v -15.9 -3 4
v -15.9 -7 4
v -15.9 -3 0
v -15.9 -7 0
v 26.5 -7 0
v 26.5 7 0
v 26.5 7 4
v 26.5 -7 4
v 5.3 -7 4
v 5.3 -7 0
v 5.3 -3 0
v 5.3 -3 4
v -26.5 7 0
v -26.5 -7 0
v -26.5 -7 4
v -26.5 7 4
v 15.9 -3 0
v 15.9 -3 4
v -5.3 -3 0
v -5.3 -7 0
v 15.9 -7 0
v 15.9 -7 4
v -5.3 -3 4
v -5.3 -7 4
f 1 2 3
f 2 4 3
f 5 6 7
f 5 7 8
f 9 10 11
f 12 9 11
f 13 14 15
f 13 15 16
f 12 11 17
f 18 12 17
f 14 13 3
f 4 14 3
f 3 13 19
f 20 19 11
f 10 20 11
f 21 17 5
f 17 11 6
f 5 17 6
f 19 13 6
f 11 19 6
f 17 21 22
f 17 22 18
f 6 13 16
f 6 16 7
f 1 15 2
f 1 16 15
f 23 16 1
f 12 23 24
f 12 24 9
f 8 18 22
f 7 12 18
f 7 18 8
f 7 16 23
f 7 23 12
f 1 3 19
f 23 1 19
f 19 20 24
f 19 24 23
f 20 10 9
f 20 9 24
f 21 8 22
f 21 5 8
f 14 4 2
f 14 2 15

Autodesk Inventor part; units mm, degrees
ref_plane "YZ Plane" through (0, 0, 0) normal (1, 0, 0) x (0, 1, 0)
ref_plane "XZ Plane" through (0, 0, 0) normal (0, 1, 0) x (-1, 0, 0)
ref_plane "XY Plane" through (0, 0, 0) normal (0, 0, 1) x (1, 0, 0)
sketch "Sketch1" plane through (0, 0, 0) normal (0, 0, 1) x (1, 0, 0)
  line L0 (-26.5, 7) -> (26.5, 7)
  line L1 (26.5, 7) -> (26.5, -7)
  line L2 (26.5, -7) -> (-26.5, -7)
  line L3 (-26.5, -7) -> (-26.5, 7)
  line L4 (-26.5, 7) -> (26.5, -7) construction
  line L5 (26.5, 7) -> (-26.5, -7) construction
  line L6 (26.5, -7) -> (15.9, -7)
  line L7 (15.9, -7) -> (15.9, -3)
  line L8 (15.9, -3) -> (26.5, -3)
  line L9 (26.5, -3) -> (26.5, -7)
  line L10 (5.3, -7) -> (5.3, -3)
  line L11 (5.3, -3) -> (15.9, -3)
  line L12 (-5.3, -7) -> (-5.3, -3)
  line L13 (-5.3, -3) -> (5.3, -3)
  line L14 (-15.9, -7) -> (-15.9, -3)
  line L15 (-15.9, -3) -> (-5.3, -3)
  line L16 (-26.5, -7) -> (-26.5, -3)
  line L17 (-26.5, -3) -> (-15.9, -3)
  point P0 (0, 0)
  dimension "d0" = 53
  dimension "d1" = 14
  dimension "d2" = 10.6
  dimension "d3" = 4
  dimension "d6" = 10.6
extrude "Extrusion1" add sketch "Sketch1" along normal blind 4 contours L0 L1 L8 L11 L13 L15 L17 L3 | L17 L14 L2 L3 | L1 L2 L7 L8 | L13 L10 L2 L12
sketch "Sketch2" plane through (0, 0, 4) normal (0, 0, 1) x (1, 0, 0)
  line L0 (-26.5, 7) -> (-26.5, -7) projected
  line L1 (-26.5, -7) -> (-15.9, -7) projected
  line L2 (-15.9, -7) -> (-15.9, -3) projected
  line L3 (-15.9, -3) -> (-5.3, -3) projected
  line L4 (-5.3, -3) -> (-5.3, -7) projected
  line L5 (-5.3, -7) -> (5.3, -7) projected
  line L6 (5.3, -7) -> (5.3, -3) projected
  line L7 (5.3, -3) -> (15.9, -3) projected
  line L8 (15.9, -3) -> (15.9, -7) projected
  line L9 (15.9, -7) -> (26.5, -7) projected
  line L10 (26.5, -7) -> (26.5, 7) projected
  line L11 (26.5, 7) -> (-26.5, 7) projected
  point P0 (0, 0)
equation "\"d1\" = height + e"
equation "\"d2\" = 0.2 * d0"
equation "\"d3\" = e"
equation "\"d6\" = d2"
equation "\"d11\" = e"
equation "\"e\" = 4"
equation "\"height\" = 10"
properties part number "wall1" material "MDF Medium Density Fiberboard"
